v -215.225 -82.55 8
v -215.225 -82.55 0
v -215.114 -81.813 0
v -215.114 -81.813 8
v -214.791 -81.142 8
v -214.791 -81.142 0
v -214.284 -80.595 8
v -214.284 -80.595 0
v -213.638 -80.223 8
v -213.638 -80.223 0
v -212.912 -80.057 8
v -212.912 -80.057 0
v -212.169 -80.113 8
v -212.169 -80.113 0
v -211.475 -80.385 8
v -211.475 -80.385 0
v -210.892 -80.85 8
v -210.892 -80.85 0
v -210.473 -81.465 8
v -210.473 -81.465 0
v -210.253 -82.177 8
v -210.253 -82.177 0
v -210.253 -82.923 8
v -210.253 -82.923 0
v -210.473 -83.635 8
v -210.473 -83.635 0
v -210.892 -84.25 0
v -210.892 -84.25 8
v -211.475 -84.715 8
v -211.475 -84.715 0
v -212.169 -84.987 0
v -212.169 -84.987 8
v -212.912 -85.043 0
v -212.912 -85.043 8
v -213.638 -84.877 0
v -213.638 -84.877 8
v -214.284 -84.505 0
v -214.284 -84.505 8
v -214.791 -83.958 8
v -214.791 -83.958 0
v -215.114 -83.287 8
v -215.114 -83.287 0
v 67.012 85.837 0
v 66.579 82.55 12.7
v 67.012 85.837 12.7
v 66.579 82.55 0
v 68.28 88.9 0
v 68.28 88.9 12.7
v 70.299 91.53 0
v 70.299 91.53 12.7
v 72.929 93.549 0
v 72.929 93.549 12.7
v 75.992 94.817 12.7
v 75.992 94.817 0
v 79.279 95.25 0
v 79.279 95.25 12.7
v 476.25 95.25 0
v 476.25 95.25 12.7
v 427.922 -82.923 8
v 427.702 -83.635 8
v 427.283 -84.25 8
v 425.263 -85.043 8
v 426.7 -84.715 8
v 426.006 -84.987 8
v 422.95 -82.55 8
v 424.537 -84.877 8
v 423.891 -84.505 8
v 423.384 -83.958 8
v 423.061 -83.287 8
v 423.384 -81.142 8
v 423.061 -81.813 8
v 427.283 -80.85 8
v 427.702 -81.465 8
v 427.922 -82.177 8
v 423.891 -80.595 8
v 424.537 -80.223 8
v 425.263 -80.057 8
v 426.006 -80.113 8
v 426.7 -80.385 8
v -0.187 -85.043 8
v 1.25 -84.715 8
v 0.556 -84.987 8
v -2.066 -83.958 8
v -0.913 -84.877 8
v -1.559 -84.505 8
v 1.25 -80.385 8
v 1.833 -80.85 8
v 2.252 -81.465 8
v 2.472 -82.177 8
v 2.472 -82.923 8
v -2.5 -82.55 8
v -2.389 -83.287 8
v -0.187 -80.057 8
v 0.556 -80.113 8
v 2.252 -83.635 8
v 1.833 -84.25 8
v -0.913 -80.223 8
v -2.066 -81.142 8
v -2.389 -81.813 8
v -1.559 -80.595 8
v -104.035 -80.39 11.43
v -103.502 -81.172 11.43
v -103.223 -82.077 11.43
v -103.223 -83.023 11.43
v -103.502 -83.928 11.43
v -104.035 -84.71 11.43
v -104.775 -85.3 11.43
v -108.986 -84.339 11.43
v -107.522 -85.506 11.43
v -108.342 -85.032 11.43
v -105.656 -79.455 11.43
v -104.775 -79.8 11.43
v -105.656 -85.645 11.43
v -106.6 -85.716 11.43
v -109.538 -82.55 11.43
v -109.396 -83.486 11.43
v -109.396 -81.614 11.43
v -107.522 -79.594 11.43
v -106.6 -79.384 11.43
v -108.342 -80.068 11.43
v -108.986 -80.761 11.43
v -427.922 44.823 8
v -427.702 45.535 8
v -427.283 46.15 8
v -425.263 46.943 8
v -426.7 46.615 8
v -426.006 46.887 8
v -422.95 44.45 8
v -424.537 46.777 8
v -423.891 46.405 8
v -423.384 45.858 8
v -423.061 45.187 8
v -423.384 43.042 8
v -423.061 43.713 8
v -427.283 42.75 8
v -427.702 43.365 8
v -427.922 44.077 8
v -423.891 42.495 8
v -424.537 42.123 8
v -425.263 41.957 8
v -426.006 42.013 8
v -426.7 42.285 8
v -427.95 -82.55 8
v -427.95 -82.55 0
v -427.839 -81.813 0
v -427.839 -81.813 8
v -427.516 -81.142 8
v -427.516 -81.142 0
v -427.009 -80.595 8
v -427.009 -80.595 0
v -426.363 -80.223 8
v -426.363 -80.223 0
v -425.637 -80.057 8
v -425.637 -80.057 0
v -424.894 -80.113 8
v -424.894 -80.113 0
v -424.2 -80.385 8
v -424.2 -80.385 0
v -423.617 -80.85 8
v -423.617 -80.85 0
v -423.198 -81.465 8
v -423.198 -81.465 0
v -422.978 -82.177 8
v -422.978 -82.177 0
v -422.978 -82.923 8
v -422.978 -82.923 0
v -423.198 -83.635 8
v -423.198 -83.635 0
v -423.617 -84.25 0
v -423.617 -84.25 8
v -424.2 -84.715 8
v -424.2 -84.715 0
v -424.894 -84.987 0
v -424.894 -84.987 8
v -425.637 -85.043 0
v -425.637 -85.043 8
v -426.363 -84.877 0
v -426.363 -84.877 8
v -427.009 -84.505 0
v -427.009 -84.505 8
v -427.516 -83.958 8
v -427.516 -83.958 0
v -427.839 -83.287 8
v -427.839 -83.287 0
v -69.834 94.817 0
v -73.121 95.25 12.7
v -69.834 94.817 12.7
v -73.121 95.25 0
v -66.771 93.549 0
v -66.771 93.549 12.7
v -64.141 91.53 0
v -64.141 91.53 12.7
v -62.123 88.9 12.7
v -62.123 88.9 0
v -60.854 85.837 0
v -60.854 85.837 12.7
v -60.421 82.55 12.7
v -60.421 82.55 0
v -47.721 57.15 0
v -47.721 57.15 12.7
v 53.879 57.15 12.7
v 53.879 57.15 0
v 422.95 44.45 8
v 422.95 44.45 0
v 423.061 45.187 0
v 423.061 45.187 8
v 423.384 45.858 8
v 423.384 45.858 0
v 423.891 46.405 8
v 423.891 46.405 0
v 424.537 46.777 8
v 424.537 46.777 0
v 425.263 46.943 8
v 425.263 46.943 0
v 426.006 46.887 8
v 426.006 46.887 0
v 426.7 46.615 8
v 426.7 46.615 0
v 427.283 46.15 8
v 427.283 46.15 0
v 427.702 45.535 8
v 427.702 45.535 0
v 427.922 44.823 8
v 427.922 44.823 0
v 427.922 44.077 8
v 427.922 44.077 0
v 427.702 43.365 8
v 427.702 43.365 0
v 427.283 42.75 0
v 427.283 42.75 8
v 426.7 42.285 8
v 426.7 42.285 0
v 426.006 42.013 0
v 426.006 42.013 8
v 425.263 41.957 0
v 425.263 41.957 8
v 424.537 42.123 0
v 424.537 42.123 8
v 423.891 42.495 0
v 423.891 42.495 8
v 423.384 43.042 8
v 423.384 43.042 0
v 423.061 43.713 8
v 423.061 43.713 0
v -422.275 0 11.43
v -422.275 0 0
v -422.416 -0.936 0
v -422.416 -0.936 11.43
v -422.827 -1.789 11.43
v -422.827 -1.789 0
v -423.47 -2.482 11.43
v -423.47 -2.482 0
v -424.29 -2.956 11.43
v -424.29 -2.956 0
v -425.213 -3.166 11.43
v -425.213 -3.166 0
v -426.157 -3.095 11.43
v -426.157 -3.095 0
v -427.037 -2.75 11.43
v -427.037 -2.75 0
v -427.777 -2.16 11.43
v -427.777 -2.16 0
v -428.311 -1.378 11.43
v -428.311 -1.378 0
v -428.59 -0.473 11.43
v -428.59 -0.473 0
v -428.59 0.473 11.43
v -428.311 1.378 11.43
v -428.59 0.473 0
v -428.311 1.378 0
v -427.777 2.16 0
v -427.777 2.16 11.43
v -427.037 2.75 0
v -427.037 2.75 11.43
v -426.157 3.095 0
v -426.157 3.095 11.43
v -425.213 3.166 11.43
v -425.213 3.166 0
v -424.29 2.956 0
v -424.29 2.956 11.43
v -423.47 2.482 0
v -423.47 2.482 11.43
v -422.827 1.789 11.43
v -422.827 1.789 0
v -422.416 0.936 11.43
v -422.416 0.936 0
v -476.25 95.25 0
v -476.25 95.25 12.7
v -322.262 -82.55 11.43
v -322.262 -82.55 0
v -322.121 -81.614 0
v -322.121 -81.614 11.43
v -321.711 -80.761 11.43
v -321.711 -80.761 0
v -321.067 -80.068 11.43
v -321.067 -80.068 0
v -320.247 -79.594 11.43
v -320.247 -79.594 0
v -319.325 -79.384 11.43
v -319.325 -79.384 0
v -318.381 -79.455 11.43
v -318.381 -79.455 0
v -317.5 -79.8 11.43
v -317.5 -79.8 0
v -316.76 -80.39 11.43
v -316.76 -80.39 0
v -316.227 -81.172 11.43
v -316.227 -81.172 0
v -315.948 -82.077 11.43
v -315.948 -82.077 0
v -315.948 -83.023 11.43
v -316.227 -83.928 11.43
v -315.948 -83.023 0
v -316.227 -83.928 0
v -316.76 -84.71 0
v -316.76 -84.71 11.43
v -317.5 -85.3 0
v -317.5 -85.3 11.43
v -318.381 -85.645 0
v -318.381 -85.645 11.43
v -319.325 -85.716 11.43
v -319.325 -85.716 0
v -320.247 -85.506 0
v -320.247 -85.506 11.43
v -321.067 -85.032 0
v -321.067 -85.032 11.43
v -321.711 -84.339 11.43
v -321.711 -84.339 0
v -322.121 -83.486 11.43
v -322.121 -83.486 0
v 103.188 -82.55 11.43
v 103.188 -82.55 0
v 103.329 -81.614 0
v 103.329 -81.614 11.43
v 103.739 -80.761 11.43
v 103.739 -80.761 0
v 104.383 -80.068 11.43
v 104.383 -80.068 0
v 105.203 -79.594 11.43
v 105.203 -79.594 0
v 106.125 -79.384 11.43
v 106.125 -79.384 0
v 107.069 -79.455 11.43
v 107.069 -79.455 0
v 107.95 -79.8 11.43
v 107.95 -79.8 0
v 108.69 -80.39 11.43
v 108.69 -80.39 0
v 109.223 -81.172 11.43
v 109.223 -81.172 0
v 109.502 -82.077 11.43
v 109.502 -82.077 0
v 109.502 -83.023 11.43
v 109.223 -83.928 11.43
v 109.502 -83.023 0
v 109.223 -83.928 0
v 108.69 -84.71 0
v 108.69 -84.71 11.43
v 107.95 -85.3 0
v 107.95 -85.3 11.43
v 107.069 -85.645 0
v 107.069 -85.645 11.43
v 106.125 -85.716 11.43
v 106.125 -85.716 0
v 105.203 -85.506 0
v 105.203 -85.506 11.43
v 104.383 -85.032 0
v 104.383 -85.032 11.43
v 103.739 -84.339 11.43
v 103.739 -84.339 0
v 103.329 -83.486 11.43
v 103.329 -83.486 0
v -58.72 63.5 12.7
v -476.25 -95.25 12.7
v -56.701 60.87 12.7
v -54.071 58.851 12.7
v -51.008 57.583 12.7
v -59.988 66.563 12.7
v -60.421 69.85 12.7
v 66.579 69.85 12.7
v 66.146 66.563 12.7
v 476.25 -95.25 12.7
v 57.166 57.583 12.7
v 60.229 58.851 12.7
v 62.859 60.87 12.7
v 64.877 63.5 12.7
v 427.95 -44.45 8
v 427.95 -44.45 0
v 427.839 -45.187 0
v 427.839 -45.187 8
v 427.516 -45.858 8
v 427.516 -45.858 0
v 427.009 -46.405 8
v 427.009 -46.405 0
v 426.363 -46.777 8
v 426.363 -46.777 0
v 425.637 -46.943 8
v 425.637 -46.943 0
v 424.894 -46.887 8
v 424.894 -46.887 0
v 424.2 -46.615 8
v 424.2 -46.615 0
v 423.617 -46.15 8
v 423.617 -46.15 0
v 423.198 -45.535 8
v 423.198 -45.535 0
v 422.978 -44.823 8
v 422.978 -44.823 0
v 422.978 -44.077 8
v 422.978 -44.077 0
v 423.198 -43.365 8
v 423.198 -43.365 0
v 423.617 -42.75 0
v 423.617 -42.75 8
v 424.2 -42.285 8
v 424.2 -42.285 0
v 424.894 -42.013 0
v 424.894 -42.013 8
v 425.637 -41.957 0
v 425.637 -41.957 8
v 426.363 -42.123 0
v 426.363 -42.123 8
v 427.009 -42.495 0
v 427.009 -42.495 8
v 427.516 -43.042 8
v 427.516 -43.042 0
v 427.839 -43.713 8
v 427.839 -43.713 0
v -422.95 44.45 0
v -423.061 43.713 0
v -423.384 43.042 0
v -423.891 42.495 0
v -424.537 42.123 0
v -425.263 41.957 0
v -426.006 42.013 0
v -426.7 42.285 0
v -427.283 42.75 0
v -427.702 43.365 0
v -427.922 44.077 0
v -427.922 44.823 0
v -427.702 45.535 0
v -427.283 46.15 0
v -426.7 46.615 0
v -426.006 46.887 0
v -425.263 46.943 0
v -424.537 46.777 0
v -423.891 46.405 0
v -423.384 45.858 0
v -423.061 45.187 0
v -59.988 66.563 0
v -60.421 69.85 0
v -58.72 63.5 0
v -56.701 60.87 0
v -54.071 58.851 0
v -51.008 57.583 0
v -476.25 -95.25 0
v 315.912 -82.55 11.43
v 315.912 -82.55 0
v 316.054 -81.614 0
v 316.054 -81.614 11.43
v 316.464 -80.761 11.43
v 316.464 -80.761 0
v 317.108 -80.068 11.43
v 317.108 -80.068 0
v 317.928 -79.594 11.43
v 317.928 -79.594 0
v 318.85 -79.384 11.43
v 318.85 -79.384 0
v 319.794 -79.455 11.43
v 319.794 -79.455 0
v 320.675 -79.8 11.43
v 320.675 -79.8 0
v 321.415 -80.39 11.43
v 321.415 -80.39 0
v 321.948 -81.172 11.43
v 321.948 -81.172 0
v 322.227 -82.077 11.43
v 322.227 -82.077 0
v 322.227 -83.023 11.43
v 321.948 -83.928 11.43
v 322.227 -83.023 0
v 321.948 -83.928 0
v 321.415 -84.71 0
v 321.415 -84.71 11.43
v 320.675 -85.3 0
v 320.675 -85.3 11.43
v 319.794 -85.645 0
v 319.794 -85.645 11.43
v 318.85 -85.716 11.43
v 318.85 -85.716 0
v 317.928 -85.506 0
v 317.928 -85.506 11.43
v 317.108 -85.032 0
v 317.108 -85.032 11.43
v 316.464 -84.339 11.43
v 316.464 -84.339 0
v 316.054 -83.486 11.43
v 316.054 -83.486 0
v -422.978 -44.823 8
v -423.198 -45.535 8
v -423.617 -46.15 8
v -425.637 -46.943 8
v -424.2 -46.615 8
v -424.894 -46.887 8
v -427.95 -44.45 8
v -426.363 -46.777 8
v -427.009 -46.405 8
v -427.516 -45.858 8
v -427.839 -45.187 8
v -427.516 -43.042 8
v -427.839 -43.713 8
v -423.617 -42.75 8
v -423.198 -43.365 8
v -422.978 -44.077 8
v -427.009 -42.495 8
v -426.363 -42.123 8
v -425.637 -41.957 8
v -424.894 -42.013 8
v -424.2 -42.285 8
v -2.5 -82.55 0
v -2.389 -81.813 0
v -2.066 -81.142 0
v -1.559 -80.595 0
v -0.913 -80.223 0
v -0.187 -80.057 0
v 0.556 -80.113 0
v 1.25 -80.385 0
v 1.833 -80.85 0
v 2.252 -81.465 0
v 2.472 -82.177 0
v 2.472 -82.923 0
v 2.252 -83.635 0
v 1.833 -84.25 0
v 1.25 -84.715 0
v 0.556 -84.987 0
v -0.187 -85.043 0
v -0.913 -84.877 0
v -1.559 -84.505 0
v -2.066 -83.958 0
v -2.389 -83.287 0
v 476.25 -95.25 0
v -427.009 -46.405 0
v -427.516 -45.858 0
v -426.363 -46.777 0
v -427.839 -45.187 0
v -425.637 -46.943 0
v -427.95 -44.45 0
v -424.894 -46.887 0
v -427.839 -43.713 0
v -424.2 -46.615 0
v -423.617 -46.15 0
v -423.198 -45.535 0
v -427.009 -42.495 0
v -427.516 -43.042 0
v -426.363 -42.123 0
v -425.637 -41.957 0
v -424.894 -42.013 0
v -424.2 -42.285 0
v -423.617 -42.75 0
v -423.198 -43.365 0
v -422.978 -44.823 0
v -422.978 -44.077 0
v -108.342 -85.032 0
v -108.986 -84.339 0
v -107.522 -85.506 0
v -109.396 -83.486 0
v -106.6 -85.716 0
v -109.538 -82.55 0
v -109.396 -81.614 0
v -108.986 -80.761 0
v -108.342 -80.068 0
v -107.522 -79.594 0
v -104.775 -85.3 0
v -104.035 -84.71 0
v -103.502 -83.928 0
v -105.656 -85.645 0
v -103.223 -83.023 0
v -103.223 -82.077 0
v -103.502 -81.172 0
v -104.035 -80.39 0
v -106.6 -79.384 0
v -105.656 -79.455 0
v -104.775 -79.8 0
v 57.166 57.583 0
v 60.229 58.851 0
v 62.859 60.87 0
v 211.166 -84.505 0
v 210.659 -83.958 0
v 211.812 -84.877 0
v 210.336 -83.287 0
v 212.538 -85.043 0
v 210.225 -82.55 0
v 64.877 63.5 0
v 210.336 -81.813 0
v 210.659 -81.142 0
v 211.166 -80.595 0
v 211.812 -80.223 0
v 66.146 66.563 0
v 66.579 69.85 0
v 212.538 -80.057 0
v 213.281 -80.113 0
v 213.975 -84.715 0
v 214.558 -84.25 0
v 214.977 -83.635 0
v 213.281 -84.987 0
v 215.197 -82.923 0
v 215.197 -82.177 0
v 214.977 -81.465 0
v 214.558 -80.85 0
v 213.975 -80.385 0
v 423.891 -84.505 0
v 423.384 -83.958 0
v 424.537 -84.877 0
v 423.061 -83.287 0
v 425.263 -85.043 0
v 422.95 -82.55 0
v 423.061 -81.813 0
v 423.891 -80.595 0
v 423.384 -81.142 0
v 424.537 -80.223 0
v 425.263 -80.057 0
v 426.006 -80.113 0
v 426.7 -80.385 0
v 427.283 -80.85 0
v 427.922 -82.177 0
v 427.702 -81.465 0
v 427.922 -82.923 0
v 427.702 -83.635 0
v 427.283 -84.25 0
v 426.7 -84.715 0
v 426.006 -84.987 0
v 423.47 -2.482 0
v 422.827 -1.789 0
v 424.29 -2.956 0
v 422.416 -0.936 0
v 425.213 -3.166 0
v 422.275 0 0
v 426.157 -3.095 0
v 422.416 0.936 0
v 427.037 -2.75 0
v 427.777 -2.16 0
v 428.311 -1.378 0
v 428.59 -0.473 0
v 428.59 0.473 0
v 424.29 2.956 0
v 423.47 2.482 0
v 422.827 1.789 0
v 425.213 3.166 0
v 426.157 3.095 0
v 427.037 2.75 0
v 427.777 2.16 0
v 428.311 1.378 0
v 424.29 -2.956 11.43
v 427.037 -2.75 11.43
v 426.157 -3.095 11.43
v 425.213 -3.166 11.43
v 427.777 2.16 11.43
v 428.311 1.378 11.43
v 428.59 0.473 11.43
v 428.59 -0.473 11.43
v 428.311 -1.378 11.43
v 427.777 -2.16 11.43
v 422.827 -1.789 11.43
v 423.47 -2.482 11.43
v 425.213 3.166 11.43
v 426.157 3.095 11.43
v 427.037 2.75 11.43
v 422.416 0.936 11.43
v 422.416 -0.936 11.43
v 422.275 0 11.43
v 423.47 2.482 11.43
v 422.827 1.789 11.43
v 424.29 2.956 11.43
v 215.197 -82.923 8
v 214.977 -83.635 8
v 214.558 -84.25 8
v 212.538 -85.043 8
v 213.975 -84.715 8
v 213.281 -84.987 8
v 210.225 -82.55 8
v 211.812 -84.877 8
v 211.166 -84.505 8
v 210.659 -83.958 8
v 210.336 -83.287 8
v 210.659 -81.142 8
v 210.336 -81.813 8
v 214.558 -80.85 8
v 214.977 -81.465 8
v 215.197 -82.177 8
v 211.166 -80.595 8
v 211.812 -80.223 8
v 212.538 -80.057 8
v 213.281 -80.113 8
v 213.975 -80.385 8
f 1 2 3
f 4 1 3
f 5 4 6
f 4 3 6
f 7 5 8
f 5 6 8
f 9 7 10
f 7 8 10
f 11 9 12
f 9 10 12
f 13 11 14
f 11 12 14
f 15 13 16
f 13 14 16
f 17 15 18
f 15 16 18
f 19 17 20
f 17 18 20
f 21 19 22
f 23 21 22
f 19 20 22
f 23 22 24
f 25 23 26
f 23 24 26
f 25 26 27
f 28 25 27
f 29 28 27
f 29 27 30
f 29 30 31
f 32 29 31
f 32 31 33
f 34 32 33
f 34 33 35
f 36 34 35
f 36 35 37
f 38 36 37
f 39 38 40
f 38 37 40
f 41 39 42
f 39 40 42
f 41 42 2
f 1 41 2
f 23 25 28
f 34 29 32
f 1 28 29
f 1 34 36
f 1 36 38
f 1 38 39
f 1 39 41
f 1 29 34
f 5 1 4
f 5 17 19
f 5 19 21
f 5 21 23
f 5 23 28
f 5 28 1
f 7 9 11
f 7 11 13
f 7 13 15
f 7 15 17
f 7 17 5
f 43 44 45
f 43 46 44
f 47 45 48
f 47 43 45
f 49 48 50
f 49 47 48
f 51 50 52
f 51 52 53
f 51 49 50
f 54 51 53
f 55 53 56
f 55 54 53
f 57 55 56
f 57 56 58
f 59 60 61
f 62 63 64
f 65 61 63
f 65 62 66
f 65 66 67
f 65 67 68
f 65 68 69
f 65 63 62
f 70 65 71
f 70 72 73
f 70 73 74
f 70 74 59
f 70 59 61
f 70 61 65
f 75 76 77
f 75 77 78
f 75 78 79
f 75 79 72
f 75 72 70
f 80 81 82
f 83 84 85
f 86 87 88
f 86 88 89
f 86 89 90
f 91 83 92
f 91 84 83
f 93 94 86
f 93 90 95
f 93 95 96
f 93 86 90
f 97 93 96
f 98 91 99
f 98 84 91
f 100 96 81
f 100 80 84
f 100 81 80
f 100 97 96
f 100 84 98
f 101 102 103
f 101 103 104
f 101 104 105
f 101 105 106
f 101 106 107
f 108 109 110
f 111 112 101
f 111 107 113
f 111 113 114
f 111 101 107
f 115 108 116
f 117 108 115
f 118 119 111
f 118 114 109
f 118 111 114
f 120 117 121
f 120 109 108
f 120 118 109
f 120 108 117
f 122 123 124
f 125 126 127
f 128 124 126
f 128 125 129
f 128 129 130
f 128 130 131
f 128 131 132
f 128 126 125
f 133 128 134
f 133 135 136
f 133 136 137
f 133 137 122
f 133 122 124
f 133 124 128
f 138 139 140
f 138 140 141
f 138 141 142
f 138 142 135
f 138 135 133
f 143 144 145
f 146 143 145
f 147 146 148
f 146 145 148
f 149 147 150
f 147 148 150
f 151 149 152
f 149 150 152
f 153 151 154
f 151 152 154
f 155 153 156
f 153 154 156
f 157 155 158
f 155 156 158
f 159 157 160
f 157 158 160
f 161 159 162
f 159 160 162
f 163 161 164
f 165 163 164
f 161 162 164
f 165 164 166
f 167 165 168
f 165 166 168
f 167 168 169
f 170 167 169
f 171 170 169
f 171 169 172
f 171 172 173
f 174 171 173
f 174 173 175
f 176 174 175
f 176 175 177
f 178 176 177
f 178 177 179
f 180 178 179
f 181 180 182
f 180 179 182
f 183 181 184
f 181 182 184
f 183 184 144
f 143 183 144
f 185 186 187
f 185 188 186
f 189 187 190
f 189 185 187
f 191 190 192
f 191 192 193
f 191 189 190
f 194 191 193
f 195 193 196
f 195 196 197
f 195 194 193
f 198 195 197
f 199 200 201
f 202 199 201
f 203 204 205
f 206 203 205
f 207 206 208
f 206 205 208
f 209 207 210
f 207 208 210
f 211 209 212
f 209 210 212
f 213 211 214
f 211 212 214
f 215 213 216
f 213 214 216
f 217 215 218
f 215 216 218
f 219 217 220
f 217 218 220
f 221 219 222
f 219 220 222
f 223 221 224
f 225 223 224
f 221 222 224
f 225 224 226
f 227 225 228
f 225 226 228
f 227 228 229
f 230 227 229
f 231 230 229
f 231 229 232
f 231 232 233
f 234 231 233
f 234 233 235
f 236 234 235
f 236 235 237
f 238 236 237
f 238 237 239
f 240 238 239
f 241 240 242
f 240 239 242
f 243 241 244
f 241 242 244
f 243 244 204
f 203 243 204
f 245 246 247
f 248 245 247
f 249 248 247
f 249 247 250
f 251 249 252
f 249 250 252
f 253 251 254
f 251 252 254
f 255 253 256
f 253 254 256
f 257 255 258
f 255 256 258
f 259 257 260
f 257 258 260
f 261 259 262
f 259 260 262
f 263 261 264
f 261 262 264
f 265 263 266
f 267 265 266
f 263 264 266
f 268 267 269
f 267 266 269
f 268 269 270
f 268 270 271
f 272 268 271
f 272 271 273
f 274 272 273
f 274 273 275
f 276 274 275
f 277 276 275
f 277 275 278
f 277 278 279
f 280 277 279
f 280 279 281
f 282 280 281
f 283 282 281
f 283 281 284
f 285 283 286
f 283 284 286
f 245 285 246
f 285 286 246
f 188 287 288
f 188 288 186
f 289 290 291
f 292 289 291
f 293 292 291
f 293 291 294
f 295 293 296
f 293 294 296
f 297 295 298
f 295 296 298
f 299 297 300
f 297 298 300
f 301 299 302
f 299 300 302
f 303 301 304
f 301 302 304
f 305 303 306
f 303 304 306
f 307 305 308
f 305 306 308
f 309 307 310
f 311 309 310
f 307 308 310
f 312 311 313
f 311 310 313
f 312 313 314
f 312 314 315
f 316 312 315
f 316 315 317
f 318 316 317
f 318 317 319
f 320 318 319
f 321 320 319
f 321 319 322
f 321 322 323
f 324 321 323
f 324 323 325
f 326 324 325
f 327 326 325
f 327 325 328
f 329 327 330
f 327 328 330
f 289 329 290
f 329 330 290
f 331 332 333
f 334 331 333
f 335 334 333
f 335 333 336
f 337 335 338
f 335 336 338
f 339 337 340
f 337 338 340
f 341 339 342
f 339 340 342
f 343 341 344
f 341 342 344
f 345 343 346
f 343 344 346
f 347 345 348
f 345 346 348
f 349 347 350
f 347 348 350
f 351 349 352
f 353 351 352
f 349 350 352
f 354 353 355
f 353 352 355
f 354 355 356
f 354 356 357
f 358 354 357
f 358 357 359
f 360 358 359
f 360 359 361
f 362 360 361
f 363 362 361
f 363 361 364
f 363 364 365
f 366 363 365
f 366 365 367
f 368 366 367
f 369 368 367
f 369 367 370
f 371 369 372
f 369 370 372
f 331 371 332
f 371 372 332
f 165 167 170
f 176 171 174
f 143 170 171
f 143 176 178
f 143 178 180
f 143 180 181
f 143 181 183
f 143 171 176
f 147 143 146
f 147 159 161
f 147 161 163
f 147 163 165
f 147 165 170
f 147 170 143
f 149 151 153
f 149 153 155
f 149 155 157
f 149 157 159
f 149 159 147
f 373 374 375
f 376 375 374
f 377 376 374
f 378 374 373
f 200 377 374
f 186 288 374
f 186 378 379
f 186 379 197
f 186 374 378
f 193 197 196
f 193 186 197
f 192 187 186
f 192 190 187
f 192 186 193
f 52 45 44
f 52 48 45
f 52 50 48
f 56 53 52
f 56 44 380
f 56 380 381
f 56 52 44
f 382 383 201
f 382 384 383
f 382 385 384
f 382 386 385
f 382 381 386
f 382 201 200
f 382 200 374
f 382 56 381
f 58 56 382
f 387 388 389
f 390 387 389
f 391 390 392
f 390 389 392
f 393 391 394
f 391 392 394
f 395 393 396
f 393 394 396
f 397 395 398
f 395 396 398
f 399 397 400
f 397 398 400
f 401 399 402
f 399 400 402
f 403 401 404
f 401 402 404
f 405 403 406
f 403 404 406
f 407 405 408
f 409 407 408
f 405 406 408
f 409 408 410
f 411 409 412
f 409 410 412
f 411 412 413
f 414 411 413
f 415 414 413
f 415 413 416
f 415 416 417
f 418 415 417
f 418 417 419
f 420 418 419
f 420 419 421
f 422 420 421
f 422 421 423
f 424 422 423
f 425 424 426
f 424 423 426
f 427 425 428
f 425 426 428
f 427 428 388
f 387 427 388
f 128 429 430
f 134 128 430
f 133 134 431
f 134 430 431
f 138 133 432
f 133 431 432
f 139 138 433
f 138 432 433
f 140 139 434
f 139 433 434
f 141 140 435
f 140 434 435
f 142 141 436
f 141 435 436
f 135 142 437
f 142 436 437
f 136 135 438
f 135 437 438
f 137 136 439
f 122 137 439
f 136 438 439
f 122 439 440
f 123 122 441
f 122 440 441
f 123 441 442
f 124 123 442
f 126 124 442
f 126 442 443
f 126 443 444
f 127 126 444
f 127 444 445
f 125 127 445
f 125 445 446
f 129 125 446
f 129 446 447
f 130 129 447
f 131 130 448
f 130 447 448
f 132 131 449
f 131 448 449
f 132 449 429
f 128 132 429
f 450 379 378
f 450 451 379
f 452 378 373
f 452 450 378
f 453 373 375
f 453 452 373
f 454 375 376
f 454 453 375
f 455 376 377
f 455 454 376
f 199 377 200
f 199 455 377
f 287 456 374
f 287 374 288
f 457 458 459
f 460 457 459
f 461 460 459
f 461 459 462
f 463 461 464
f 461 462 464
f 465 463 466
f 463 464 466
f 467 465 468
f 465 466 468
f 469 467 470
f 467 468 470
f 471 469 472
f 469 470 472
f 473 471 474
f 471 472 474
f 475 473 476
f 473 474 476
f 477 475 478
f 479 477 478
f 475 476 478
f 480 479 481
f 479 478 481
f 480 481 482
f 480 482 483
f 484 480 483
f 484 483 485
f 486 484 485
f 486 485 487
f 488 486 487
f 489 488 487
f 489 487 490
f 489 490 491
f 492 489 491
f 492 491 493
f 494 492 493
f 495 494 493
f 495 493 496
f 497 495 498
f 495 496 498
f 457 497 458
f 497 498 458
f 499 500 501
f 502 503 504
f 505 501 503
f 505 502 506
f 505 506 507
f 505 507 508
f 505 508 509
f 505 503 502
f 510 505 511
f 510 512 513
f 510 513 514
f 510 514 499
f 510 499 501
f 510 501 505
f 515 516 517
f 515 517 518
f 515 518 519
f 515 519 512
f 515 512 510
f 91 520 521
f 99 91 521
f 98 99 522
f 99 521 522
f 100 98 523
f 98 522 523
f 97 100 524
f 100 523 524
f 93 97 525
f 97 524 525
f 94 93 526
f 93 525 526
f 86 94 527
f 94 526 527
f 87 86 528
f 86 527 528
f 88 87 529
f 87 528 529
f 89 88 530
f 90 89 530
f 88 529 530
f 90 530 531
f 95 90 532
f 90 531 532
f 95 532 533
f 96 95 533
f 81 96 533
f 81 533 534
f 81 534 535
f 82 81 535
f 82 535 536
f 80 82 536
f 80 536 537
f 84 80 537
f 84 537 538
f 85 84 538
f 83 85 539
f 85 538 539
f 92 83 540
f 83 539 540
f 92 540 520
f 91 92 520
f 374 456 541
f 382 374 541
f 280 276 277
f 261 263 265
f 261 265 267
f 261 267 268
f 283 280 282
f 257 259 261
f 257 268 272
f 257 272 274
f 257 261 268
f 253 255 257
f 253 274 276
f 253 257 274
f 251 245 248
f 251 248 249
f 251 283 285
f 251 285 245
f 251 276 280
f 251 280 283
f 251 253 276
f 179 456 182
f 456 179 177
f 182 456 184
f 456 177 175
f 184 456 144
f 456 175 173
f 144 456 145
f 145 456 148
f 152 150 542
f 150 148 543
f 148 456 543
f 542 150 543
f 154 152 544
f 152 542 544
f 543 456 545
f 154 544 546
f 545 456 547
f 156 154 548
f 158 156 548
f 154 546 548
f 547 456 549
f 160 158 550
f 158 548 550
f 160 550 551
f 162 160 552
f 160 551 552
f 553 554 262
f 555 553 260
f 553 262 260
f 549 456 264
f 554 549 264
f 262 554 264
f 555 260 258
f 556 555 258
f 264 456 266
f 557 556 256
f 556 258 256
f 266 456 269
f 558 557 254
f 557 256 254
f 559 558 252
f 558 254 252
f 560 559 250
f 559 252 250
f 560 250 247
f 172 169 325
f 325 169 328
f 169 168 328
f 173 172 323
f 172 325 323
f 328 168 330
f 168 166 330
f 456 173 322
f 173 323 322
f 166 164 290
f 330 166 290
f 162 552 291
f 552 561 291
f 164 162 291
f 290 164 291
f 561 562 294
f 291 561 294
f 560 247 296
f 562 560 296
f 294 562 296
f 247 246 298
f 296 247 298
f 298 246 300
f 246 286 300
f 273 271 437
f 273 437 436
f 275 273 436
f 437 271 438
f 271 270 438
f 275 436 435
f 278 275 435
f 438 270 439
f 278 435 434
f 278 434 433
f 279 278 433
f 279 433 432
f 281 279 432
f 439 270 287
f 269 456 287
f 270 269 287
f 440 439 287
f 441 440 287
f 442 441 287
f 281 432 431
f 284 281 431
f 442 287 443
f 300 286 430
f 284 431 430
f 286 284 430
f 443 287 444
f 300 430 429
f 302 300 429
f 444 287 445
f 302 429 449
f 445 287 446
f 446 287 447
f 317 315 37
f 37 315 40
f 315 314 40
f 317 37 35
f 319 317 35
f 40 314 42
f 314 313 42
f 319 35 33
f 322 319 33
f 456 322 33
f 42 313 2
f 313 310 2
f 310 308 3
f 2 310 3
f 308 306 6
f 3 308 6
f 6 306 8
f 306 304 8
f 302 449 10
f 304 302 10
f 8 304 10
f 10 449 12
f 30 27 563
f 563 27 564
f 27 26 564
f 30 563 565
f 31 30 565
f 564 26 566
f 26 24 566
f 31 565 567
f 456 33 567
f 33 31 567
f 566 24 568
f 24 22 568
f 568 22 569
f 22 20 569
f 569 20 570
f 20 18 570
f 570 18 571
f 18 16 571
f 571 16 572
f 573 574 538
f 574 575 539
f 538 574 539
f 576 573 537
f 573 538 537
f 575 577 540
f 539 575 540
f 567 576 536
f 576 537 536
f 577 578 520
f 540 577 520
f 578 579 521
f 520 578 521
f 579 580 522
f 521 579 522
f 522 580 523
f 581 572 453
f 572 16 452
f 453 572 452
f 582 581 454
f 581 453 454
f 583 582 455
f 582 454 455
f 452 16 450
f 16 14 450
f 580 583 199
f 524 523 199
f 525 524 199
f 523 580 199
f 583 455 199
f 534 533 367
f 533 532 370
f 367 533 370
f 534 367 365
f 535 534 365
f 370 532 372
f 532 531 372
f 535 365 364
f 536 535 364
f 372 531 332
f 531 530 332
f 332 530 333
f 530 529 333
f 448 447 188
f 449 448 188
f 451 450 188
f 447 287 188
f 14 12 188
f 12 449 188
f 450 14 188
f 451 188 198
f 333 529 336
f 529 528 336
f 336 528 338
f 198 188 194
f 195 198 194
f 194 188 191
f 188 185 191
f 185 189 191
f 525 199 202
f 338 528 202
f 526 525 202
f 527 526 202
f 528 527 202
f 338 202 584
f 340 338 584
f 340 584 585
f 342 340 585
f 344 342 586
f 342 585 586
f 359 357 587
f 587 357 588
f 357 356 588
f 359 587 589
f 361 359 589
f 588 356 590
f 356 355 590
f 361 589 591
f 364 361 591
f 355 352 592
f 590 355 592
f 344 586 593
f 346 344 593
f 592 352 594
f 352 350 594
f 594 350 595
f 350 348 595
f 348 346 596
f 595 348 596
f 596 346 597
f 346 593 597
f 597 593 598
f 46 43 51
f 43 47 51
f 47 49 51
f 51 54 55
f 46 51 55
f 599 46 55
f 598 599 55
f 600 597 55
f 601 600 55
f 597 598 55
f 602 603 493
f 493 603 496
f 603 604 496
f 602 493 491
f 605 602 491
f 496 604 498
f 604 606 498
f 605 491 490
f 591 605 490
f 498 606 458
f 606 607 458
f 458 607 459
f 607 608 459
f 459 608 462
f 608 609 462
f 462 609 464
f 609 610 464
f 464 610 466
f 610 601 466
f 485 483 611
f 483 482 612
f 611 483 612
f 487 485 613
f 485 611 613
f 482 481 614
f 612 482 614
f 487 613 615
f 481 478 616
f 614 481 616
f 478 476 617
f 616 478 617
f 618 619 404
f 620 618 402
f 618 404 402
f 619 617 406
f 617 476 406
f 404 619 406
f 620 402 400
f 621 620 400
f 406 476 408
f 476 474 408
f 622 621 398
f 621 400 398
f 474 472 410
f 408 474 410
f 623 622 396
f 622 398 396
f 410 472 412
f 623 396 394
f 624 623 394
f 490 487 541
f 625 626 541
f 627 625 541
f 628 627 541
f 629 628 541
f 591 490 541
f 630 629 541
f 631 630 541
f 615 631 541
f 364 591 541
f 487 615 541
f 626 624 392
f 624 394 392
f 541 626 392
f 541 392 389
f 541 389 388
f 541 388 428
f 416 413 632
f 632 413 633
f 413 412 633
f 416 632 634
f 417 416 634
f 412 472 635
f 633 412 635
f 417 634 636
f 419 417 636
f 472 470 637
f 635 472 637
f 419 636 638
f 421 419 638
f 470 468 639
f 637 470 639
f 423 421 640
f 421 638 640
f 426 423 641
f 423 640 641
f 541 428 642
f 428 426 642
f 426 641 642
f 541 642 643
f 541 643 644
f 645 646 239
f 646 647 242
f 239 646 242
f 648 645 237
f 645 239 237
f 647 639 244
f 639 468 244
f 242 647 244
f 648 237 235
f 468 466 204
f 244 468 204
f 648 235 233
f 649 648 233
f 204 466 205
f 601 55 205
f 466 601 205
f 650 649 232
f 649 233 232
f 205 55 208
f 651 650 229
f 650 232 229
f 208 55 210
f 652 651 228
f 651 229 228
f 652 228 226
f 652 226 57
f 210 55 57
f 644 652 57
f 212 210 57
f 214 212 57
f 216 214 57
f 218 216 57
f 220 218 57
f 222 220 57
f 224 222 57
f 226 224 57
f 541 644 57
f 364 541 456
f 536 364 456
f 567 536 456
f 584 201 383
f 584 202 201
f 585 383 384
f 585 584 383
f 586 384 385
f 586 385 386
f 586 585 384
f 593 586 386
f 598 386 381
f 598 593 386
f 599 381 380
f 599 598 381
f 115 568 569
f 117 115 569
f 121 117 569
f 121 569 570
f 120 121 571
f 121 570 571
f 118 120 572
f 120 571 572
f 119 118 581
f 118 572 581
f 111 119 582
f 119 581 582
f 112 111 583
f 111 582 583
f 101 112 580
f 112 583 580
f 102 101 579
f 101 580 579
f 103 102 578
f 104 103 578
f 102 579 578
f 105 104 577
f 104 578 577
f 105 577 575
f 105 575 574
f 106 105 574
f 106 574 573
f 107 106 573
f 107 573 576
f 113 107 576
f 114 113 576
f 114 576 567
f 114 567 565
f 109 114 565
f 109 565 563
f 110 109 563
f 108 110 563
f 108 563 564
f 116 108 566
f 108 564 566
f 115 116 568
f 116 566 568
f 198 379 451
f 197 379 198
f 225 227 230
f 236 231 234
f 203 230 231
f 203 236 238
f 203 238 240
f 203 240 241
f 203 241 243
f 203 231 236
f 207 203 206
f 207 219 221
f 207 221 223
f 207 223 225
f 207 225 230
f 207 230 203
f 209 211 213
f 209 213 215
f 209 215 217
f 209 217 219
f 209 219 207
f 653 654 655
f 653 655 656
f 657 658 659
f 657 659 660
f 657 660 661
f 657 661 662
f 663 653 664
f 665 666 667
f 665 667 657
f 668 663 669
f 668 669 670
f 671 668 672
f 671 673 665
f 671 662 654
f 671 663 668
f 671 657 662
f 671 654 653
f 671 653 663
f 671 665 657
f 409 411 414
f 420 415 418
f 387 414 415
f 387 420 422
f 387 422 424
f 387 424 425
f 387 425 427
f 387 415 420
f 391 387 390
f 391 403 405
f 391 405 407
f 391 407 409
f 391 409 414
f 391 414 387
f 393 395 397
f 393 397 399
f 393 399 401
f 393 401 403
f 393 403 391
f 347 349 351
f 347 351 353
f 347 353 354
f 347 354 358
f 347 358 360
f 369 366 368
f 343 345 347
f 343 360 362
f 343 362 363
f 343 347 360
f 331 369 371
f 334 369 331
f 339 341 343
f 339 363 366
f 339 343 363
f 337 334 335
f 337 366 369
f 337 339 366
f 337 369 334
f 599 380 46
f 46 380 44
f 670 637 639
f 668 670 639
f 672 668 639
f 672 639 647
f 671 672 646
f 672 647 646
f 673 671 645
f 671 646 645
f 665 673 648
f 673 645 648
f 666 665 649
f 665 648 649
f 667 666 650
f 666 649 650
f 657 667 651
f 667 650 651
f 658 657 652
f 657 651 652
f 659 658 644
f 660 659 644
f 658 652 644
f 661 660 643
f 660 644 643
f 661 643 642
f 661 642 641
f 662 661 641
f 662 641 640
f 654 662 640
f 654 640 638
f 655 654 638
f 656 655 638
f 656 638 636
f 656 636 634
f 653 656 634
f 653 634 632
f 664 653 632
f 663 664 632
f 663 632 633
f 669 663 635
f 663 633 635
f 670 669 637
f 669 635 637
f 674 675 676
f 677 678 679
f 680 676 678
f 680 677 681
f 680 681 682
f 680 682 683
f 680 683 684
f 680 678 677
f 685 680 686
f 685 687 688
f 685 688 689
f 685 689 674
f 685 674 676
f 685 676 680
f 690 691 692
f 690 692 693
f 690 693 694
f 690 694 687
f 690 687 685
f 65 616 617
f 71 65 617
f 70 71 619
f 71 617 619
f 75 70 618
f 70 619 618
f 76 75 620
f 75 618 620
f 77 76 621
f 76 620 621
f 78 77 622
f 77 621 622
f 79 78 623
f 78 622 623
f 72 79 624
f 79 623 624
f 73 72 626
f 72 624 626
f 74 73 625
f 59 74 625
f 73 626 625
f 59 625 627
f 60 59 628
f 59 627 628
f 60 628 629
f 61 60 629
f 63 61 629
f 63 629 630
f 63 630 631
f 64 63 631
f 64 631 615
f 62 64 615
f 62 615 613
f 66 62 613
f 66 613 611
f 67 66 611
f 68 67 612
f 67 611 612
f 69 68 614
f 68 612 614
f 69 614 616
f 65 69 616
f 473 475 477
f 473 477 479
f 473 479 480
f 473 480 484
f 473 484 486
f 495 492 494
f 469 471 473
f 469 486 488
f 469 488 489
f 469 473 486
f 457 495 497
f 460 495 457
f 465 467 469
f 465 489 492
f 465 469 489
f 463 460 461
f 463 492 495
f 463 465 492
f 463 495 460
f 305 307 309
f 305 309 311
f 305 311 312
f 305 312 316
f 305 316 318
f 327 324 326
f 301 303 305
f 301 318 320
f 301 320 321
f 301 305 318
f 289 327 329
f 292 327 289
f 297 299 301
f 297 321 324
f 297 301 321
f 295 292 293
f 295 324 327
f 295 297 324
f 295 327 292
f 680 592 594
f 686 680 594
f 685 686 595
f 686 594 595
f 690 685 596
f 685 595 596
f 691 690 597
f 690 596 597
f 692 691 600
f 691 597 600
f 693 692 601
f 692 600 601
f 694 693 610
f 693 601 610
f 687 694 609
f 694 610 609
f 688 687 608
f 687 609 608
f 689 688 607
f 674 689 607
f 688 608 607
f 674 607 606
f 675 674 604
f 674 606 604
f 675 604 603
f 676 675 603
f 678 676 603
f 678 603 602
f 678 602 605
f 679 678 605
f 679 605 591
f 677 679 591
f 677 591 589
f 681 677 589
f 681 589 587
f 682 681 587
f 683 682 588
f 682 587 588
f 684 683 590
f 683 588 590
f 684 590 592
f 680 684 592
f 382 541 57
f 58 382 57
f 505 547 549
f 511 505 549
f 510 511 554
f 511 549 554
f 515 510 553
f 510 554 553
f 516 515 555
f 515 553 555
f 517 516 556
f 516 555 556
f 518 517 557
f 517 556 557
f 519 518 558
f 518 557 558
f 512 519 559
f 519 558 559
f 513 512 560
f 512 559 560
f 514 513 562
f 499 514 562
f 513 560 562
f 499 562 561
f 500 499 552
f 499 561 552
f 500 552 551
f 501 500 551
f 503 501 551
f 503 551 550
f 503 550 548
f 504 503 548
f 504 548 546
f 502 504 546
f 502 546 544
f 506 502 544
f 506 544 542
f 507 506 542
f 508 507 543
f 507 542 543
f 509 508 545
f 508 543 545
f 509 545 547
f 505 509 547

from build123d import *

# Parameters (mm, degrees)
SKETCH1_W           = 952.5
SKETCH1_H           = 190.5
BOSS_EXTRUDE1_DEPTH = 12.7
SKETCH5_W           = 127
SKETCH5_H           = 38.1
CUT_EXTRUDE3_DEPTH  = 486.84762529
FILLET1_R           = 12.7
SKETCH6_R           = 3.175
CUT_EXTRUDE4_DEPTH  = 11.43
SKETCH7_R           = 2.5
CUT_EXTRUDE5_DEPTH  = 8
SKETCH8_R           = 2.5
CUT_EXTRUDE6_DEPTH  = 8
SKETCH9_R           = 3.175
CUT_EXTRUDE7_DEPTH  = 11.43


with BuildPart() as part:
    # Sketch1 → Boss-Extrude1 (new body)
    with BuildSketch(Plane.XY):
        Rectangle(SKETCH1_W, SKETCH1_H)
    extrude(amount=BOSS_EXTRUDE1_DEPTH)

    # Sketch5 → Cut-Extrude3 (cut, through all)
    with BuildSketch(Plane.XY.offset(12.7)):
        with Locations((3.078763255, 76.2)):
            Rectangle(SKETCH5_W, SKETCH5_H)
    extrude(amount=-CUT_EXTRUDE3_DEPTH, mode=Mode.SUBTRACT)

    # Fillet1
    fillet1_edges = [part.edges().sort_by_distance(p)[0] for p in [
        (66.578763255, 95.25, 6.35),
        (66.578763255, 57.15, 6.35),
        (-60.421236745, 57.15, 6.35),
        (-60.421236745, 95.25, 6.35),
    ]]
    fillet(fillet1_edges, radius=FILLET1_R)

    # Sketch6 → Cut-Extrude4 (cut)
    with BuildSketch(Plane(origin=(0, 0, 0), x_dir=(-1, 0, 0), z_dir=(0, 0, -1))):
        with Locations((-425.45, 0)):
            Circle(SKETCH6_R)
        with Locations(Location((425.45, 0, 0), (0, 0, 180))):
            Circle(SKETCH6_R)
    extrude(amount=-CUT_EXTRUDE4_DEPTH, mode=Mode.SUBTRACT)

    # Sketch7 → Cut-Extrude5 (cut)
    with BuildSketch(Plane(origin=(0, 0, 0), x_dir=(-1, 0, 0), z_dir=(0, 0, -1))):
        with Locations((-425.45, 44.45)):
            Circle(SKETCH7_R)
        with Locations(Location((-425.45, -44.45, 0), (0, 0, 180))):
            Circle(SKETCH7_R)
        with Locations((425.45, -44.45)):
            Circle(SKETCH7_R)
        with Locations(Location((425.45, 44.45, 0), (0, 0, 180))):
            Circle(SKETCH7_R)
    extrude(amount=-CUT_EXTRUDE5_DEPTH, mode=Mode.SUBTRACT)

    # Sketch8 → Cut-Extrude6 (cut)
    with BuildSketch(Plane(origin=(0, 0, 0), x_dir=(-1, 0, 0), z_dir=(0, 0, -1))):
        with Locations((-425.45, -82.55)):
            Circle(SKETCH8_R)
        with Locations((-212.725, -82.55)):
            Circle(SKETCH8_R)
        with Locations((0, -82.55)):
            Circle(SKETCH8_R)
        with Locations((212.725, -82.55)):
            Circle(SKETCH8_R)
        with Locations((425.45, -82.55)):
            Circle(SKETCH8_R)
    extrude(amount=-CUT_EXTRUDE6_DEPTH, mode=Mode.SUBTRACT)

    # Sketch9 → Cut-Extrude7 (cut)
    with BuildSketch(Plane(origin=(0, 0, 0), x_dir=(-1, 0, 0), z_dir=(0, 0, -1))):
        with Locations((-319.0875, -82.55)):
            Circle(SKETCH9_R)
        with Locations((-106.3625, -82.55)):
            Circle(SKETCH9_R)
        with Locations((106.3625, -82.55)):
            Circle(SKETCH9_R)
        with Locations((319.0875, -82.55)):
            Circle(SKETCH9_R)
    extrude(amount=-CUT_EXTRUDE7_DEPTH, mode=Mode.SUBTRACT)


solid = part.part
